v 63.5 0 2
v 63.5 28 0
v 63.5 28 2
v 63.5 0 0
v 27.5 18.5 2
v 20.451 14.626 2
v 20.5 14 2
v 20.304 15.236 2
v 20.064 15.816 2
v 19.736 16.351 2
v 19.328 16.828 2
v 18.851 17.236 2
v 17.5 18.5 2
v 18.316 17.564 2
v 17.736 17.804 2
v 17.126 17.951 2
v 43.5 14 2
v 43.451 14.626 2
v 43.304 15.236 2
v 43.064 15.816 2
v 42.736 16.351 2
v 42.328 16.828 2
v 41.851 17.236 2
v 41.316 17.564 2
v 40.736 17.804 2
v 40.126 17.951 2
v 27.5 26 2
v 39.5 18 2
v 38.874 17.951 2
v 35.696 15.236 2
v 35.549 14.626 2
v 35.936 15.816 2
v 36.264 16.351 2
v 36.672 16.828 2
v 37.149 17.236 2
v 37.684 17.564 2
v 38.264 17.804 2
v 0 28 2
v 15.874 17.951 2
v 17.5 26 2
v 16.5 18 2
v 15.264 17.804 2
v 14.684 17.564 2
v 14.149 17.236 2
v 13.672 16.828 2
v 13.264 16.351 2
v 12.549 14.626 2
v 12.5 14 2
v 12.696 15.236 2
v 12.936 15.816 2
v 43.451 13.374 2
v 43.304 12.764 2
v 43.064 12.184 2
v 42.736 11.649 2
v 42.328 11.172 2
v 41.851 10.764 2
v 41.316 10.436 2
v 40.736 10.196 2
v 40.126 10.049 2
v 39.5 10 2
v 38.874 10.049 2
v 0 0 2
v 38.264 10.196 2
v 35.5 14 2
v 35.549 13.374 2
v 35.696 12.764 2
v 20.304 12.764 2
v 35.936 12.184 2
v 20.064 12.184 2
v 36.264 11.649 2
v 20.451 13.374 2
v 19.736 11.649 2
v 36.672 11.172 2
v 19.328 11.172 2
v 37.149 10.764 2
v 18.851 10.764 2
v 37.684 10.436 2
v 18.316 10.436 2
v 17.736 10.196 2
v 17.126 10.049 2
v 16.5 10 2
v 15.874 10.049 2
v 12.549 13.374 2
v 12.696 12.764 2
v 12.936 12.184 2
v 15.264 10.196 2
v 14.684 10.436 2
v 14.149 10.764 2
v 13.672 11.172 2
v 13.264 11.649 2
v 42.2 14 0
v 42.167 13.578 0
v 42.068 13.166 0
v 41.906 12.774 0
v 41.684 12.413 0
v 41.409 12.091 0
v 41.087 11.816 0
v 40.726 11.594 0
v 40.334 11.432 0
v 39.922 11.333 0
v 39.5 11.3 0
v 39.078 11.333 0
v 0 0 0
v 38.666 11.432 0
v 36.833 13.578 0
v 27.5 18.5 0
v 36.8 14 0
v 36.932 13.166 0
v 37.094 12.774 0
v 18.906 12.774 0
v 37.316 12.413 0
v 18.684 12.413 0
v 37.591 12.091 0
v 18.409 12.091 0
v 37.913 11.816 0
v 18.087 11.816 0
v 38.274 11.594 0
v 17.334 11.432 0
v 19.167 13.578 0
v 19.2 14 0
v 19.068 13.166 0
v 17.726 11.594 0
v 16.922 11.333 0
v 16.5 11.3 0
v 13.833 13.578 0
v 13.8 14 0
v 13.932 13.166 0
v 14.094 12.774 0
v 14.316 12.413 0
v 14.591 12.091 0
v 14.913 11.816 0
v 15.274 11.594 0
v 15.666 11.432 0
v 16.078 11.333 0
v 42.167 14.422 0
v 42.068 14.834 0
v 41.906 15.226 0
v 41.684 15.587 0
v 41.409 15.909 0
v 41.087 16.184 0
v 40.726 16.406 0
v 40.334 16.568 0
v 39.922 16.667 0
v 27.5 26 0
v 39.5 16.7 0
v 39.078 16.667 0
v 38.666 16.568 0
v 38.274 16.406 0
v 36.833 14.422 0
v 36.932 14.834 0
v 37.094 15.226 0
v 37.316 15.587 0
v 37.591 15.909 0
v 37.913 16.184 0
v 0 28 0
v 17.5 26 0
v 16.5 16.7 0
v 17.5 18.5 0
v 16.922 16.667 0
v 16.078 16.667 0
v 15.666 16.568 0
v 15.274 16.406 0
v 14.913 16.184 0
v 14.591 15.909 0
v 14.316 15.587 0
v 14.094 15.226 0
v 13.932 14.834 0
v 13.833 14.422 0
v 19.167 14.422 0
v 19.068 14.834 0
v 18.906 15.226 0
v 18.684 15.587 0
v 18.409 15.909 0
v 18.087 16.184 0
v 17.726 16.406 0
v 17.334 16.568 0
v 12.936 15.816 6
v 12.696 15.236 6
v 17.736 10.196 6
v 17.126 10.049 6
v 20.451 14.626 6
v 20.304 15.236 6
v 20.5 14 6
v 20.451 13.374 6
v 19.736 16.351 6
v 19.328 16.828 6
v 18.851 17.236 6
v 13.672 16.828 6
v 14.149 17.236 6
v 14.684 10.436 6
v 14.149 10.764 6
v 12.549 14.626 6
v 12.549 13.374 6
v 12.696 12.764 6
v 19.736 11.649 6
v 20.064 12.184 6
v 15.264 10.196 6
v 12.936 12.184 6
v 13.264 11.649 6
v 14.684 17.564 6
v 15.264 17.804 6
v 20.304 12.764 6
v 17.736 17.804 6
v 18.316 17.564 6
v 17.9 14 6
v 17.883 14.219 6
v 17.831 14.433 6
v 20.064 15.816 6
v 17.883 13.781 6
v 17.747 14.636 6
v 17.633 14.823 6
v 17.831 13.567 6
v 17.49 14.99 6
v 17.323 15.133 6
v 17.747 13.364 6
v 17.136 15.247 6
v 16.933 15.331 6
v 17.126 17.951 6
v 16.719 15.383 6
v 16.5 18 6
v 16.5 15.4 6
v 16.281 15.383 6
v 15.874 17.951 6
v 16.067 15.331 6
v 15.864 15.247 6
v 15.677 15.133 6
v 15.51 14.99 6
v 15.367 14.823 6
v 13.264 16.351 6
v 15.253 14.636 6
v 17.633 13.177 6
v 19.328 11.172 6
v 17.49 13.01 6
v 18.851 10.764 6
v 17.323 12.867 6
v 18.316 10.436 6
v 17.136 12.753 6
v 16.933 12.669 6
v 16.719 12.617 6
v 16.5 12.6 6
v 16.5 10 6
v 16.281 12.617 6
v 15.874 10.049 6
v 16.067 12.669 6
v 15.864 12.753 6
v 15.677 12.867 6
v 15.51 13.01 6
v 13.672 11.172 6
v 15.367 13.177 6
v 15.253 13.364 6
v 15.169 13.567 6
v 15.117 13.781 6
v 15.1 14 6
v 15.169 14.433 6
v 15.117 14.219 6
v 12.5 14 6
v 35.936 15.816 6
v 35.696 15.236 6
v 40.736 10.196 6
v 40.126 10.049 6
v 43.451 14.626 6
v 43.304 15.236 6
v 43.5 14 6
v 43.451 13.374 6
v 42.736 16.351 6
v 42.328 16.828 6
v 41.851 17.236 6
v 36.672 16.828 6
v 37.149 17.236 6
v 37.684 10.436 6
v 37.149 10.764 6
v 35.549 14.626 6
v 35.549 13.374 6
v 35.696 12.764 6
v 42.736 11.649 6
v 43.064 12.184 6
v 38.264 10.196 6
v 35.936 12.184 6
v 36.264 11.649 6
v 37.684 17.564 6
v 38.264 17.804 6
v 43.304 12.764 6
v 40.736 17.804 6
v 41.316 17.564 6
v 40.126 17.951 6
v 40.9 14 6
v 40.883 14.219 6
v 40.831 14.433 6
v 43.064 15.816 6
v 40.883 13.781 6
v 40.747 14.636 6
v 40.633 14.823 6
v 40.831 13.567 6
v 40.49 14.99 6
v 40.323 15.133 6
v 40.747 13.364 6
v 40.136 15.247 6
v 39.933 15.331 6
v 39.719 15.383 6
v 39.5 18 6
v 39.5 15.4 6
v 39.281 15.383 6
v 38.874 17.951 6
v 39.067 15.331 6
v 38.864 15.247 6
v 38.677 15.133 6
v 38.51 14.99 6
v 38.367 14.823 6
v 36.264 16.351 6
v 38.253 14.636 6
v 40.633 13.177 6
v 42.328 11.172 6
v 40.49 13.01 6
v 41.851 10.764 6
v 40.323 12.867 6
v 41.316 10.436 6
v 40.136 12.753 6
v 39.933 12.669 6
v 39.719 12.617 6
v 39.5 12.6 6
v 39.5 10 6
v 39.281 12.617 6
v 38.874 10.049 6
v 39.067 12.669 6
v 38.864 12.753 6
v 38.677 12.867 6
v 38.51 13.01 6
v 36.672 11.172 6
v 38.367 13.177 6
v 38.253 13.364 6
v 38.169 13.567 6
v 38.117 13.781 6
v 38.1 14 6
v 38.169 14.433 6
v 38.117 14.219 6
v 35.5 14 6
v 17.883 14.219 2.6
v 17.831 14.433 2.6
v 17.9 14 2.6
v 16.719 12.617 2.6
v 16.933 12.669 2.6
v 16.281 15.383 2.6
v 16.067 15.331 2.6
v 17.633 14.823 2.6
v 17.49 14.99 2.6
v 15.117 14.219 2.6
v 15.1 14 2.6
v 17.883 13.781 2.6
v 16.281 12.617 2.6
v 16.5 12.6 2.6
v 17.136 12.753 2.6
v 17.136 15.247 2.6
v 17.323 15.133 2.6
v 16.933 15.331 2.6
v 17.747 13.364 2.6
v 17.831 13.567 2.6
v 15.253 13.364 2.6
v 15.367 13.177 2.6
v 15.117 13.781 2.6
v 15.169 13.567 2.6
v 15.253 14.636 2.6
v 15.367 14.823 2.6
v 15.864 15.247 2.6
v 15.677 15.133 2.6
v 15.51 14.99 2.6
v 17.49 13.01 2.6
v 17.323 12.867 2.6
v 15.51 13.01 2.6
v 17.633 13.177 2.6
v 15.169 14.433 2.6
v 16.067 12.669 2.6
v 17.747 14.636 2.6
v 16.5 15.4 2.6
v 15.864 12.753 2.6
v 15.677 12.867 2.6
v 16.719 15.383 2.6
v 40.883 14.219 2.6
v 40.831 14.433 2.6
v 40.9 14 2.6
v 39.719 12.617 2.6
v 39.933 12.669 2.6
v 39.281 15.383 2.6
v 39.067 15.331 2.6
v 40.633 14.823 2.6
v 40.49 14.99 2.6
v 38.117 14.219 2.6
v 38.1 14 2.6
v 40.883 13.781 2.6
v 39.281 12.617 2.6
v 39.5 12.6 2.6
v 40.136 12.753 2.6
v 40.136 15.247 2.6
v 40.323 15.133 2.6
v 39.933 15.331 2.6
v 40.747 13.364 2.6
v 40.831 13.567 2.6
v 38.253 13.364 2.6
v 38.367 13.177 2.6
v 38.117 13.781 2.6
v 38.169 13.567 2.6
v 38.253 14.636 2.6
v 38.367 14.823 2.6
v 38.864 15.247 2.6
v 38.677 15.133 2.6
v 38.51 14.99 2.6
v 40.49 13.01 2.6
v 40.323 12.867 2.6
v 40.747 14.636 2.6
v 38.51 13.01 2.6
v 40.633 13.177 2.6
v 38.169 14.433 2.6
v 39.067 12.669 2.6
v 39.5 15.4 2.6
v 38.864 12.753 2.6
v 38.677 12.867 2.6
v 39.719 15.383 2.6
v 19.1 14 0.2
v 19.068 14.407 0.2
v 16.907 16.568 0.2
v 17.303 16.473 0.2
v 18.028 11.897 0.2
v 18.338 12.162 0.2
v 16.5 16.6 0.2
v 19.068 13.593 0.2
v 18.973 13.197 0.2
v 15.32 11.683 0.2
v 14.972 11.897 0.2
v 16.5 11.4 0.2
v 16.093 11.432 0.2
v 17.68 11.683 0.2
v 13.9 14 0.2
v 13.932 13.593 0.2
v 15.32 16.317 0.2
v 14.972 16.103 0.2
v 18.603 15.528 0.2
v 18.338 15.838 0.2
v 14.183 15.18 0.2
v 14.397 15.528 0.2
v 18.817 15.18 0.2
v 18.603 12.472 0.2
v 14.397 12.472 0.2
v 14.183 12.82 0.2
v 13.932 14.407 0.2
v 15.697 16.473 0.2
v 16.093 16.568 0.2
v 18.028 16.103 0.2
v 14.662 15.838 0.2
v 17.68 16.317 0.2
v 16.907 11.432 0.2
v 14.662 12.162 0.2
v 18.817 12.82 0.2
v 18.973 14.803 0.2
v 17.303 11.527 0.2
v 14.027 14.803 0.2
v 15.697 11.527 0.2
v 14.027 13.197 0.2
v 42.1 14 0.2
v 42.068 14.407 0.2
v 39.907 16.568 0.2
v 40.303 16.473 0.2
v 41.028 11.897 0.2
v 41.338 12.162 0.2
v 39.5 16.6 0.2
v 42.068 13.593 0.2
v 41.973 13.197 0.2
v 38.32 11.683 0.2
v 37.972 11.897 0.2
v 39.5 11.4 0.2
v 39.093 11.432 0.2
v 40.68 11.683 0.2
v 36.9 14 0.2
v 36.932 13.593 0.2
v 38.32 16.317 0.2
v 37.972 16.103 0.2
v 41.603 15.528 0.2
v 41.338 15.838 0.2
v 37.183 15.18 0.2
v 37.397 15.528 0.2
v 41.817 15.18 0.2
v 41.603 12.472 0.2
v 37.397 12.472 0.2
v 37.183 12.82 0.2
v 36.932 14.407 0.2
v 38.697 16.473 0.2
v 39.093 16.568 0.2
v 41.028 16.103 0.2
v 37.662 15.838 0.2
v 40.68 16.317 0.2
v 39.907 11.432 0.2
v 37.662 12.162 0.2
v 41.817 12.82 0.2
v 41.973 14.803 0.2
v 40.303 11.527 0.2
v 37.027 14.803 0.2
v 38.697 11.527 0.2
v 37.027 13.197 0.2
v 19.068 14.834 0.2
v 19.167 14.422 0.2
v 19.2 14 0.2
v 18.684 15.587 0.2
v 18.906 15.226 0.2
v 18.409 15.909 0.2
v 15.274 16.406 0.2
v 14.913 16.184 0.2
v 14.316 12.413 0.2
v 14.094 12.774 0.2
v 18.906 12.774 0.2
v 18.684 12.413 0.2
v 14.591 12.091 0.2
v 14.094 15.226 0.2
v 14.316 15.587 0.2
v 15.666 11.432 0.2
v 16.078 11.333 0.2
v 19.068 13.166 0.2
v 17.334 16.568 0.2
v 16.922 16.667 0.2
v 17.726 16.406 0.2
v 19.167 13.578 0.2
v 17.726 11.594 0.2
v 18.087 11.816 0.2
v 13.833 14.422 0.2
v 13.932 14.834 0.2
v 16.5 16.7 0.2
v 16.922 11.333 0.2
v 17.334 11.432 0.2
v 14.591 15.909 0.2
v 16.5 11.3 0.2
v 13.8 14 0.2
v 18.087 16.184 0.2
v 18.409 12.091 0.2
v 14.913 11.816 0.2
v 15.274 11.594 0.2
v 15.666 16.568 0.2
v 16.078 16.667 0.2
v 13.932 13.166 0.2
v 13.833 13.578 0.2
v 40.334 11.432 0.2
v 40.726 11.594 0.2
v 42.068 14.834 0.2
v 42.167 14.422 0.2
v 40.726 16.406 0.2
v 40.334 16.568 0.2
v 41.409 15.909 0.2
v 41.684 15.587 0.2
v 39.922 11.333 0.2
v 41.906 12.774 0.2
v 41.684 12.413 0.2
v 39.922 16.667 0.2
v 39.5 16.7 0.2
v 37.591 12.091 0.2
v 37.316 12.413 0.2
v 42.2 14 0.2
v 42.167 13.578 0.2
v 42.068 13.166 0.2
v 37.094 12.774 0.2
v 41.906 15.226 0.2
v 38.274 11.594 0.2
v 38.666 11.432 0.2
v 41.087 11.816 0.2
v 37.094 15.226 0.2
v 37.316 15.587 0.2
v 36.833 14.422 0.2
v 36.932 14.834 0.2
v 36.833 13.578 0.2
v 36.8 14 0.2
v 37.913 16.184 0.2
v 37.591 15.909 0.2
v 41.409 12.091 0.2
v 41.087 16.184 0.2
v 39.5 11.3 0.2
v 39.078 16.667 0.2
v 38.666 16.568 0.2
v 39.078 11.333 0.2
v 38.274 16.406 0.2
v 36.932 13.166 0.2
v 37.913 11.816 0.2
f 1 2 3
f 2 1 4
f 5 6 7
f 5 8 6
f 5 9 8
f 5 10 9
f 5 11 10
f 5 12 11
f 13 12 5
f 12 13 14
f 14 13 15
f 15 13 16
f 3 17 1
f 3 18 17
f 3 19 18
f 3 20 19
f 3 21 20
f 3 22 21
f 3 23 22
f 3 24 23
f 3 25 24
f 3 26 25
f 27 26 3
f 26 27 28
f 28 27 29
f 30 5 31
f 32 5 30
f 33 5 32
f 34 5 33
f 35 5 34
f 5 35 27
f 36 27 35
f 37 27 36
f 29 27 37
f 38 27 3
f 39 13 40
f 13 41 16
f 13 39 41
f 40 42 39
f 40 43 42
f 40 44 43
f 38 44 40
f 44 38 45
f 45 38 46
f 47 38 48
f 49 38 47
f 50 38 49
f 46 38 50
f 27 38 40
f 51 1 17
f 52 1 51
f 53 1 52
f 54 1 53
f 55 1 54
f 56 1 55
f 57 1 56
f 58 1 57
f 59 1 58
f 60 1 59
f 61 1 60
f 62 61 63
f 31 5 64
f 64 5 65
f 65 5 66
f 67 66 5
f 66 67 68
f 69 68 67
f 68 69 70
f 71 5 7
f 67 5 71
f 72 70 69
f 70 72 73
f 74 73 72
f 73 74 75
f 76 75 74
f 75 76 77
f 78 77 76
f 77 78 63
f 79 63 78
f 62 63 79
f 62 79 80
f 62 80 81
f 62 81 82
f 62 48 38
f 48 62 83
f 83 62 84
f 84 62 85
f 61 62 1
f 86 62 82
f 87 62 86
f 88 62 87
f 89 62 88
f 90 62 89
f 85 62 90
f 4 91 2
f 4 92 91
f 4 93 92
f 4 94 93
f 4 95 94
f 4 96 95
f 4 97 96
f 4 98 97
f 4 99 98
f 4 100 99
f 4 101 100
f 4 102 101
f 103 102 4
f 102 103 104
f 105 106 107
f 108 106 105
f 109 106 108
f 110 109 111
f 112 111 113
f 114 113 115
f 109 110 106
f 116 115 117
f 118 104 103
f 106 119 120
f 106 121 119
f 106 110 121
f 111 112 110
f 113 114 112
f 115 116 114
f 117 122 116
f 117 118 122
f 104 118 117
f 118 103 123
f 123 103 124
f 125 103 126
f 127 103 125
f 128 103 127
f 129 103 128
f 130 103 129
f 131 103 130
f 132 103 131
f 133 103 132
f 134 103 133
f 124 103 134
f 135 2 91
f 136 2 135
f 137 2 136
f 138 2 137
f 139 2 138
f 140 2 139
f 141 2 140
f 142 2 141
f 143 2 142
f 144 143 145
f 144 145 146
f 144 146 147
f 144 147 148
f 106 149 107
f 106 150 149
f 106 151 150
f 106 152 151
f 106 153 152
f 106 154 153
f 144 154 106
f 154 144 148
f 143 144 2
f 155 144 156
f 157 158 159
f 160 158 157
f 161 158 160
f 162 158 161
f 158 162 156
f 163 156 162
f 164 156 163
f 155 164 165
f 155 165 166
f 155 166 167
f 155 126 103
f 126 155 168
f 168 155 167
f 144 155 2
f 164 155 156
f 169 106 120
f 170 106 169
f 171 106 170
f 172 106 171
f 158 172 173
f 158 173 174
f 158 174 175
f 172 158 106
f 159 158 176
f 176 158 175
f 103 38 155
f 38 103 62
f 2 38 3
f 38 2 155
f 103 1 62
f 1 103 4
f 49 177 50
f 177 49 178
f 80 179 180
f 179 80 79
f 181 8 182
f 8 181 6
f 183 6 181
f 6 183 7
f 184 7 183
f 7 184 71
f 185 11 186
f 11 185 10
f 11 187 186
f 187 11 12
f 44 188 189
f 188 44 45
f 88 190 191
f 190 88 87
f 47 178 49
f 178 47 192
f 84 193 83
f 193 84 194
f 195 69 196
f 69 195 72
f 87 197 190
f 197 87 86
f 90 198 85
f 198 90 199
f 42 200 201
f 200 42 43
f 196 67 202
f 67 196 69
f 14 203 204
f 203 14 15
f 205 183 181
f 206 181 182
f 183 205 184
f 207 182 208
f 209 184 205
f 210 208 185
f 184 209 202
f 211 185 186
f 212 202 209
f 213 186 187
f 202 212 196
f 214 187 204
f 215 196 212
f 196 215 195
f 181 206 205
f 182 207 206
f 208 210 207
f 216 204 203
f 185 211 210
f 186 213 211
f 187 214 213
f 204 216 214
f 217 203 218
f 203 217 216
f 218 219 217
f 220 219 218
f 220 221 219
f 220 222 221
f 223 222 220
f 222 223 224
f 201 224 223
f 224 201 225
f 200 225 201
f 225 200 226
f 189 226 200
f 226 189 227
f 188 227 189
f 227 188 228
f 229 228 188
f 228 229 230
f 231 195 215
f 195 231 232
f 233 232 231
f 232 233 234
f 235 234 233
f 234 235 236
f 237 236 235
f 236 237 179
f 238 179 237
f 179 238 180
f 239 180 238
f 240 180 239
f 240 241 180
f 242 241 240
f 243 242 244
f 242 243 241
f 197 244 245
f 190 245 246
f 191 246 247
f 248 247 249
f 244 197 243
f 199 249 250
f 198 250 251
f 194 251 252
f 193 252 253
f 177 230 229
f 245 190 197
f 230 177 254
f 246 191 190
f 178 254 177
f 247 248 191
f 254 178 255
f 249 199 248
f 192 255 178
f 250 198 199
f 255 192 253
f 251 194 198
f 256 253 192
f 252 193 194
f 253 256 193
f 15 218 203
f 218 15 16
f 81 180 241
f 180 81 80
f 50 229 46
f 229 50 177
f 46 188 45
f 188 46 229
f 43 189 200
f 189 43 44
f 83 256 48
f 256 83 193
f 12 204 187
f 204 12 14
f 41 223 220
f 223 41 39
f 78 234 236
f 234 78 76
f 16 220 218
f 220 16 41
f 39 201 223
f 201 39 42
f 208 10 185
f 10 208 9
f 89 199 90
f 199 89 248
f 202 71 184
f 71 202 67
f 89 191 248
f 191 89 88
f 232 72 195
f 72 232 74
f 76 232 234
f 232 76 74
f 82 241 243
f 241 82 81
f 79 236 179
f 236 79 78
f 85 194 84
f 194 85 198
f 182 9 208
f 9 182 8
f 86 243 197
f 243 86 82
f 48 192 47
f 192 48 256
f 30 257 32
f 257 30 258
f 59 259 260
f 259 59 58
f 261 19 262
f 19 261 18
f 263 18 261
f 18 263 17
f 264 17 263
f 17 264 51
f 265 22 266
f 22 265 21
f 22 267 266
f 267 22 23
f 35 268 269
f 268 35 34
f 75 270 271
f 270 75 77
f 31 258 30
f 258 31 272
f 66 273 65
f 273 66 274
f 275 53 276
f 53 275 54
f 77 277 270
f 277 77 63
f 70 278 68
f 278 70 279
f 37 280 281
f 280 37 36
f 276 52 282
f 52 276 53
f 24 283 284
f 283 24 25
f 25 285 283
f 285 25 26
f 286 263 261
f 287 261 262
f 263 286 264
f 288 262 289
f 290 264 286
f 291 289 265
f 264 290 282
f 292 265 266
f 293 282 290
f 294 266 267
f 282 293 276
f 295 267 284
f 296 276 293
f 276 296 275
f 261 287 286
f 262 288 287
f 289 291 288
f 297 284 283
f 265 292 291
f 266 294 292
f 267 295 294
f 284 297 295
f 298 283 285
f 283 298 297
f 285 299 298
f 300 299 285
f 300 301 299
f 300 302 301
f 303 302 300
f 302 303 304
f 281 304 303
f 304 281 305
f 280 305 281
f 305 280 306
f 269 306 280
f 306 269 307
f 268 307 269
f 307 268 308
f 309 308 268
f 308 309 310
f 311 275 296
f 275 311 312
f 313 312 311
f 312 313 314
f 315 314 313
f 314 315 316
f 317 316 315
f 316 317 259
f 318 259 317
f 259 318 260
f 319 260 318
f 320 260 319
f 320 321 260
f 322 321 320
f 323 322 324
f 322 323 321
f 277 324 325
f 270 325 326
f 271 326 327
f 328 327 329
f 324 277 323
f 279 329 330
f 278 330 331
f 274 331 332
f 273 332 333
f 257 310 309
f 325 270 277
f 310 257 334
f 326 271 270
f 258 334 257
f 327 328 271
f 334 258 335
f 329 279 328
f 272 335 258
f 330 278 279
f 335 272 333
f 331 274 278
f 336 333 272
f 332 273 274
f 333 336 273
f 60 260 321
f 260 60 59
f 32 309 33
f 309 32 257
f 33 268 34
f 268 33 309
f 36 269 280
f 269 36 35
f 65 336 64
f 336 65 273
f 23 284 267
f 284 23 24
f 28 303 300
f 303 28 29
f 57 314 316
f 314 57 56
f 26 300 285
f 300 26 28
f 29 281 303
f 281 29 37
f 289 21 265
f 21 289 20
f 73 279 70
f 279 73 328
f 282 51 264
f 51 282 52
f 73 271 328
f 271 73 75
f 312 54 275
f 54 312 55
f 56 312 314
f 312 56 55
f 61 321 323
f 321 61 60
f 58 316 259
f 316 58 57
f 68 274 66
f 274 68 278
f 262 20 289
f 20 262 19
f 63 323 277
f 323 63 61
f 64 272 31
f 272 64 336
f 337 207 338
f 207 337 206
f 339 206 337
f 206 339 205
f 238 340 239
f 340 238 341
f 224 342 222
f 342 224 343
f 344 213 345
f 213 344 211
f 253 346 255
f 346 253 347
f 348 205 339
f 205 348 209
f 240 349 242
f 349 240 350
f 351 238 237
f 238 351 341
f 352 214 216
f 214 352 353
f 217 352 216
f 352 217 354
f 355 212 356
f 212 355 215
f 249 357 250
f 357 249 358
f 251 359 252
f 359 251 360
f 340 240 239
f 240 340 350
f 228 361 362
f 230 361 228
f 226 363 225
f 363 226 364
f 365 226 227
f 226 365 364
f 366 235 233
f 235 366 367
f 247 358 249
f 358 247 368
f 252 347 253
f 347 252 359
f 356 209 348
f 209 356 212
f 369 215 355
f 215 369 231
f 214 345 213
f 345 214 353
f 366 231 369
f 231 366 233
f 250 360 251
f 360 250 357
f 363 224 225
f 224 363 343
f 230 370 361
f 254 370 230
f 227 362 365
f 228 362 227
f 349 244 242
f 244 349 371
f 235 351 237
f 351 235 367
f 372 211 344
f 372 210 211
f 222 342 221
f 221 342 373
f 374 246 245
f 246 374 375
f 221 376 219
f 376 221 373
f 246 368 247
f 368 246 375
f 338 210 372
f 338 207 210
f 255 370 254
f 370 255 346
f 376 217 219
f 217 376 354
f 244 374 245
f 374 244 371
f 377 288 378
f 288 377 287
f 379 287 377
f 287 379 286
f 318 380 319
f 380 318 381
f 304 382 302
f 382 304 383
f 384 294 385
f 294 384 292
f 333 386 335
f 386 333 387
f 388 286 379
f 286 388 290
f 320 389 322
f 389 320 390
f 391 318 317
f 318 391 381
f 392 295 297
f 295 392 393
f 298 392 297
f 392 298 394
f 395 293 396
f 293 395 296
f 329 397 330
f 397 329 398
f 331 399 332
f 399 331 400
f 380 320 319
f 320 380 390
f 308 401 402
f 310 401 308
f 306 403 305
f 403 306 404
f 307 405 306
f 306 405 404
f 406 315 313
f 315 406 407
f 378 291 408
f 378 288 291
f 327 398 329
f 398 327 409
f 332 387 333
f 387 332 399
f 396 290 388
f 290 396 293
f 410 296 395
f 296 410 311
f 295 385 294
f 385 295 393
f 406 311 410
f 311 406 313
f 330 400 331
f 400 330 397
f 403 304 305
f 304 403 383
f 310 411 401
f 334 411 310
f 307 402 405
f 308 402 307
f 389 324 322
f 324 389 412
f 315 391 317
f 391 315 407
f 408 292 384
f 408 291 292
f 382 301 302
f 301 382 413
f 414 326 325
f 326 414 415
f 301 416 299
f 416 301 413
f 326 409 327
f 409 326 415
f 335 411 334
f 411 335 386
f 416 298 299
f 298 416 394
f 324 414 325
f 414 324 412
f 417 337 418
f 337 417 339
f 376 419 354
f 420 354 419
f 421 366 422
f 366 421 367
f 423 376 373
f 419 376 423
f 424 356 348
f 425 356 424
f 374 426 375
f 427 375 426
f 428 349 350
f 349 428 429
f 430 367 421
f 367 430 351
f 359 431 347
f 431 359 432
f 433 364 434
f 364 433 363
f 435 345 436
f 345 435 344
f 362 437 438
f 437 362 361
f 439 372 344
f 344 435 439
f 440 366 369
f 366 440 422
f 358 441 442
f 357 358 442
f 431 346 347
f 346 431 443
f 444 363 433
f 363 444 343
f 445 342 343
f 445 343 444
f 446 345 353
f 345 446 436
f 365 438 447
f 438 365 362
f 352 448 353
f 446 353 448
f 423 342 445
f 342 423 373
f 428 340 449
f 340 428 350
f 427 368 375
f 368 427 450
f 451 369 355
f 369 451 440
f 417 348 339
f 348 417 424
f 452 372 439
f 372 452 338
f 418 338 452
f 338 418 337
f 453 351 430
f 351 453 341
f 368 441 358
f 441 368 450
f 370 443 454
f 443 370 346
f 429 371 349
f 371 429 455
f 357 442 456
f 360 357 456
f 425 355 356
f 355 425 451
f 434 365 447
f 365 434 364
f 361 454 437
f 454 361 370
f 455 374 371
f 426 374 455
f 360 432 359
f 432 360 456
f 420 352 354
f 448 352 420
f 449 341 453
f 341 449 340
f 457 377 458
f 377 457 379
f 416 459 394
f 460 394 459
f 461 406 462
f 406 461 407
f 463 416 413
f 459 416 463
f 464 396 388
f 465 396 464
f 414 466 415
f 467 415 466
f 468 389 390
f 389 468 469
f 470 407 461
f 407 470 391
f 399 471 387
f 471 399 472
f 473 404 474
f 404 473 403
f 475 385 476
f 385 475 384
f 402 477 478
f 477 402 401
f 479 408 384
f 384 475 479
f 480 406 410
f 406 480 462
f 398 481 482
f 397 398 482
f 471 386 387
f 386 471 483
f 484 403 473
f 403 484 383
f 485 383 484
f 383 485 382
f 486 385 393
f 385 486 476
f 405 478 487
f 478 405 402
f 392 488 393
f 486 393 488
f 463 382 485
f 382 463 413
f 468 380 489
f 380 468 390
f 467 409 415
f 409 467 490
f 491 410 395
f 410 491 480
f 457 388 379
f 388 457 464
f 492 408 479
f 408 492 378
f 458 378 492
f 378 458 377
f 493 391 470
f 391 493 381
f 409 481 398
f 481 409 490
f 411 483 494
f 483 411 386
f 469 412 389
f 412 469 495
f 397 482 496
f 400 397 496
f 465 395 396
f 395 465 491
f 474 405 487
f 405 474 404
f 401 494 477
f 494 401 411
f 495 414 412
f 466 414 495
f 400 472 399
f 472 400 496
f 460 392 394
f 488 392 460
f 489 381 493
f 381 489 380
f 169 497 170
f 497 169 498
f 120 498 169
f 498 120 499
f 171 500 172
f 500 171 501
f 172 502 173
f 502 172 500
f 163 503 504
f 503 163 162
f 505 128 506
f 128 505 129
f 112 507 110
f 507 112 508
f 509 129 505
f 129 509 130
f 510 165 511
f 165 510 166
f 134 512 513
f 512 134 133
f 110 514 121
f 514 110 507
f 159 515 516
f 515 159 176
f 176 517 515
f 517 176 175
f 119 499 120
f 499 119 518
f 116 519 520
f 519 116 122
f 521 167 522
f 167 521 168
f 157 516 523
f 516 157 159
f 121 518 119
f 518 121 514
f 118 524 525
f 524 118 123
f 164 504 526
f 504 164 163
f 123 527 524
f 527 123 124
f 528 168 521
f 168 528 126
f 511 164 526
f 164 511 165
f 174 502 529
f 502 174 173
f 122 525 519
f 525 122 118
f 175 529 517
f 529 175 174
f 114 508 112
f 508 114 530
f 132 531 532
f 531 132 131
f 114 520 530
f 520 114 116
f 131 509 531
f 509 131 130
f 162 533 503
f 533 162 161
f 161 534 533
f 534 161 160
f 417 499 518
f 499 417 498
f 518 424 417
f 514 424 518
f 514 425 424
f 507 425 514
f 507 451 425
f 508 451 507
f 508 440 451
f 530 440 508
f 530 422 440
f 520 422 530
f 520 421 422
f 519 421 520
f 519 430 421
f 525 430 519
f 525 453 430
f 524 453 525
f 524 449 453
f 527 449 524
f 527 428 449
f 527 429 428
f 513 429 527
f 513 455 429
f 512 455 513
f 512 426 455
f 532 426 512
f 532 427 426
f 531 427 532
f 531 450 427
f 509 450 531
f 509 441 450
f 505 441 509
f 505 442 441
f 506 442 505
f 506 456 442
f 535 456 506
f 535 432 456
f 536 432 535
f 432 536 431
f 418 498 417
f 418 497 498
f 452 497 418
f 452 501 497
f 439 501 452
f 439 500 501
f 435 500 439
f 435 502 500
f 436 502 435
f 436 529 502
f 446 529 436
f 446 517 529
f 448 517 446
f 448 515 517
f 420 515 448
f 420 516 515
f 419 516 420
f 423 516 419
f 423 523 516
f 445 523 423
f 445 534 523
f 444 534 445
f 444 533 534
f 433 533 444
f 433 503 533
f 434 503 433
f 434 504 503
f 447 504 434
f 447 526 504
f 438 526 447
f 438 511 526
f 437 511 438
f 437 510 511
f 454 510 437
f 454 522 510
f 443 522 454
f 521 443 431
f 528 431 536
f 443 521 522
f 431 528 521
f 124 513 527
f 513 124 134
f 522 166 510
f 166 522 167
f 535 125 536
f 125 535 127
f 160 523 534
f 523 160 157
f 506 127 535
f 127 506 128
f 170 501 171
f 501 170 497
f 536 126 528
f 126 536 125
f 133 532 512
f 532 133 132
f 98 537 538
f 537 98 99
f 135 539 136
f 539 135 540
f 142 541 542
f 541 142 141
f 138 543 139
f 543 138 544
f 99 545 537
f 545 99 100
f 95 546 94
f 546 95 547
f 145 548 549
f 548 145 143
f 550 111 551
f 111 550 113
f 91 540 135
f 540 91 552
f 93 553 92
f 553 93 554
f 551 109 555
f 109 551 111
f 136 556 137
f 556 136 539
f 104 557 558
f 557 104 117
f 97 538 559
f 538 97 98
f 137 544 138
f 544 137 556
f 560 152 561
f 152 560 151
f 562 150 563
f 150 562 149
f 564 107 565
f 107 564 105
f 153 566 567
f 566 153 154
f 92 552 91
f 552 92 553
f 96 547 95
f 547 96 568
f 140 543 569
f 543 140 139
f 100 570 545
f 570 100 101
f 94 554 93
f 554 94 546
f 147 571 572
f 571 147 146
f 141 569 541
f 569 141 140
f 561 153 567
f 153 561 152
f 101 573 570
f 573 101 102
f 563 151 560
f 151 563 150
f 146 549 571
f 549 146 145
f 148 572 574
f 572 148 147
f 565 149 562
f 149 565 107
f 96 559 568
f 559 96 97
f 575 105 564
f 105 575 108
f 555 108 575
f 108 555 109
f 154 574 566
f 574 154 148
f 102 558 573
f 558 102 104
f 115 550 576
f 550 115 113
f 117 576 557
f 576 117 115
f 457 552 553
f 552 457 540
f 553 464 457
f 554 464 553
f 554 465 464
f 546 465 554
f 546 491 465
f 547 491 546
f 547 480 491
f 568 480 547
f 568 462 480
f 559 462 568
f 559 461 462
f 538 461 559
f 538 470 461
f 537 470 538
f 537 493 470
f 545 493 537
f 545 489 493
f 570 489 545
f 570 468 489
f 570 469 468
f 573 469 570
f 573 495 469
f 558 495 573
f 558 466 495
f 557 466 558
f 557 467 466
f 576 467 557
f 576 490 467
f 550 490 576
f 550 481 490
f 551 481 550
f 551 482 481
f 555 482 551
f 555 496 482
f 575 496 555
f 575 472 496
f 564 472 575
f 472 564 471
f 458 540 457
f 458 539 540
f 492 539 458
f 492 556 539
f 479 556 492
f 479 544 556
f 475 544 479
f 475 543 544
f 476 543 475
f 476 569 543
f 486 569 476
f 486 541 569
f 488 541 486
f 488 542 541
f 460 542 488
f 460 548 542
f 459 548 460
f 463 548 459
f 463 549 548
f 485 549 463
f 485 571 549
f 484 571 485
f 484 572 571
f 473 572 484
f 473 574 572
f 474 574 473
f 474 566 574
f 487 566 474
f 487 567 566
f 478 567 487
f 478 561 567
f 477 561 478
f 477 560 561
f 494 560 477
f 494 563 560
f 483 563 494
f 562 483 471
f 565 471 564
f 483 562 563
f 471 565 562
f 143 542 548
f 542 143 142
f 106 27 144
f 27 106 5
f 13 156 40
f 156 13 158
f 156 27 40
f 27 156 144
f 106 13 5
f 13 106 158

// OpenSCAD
// Insulator for sensor board with mounting for ultrasonic transducer

$fn=40;
thickness = 2;
holeY=14;
hole1X=16.5;
hole2X=hole1X+23;
transducerY = 4.5;
pillarHeight = 4.0;
pillarRadius = 4.0;	// use 4.5 if using deep countersinks
overlap=1;

difference() {
	union() {
		// main plate
		cube([63.5,28,thickness]);
		// pillars
		translate([hole1X,holeY,thickness-overlap]) cylinder(h=pillarHeight+overlap,r=pillarRadius);
		translate([hole2X,holeY,thickness-overlap]) cylinder(h=pillarHeight+overlap,r=pillarRadius);
	}
	// screw holes in pillars
	translate([hole1X,holeY,-overlap]) cylinder(h=20,r=1.4);
	translate([hole2X,holeY,-overlap]) cylinder(h=20,r=1.4);
	// countersinks, leaving about 3mm of screw to tap into the heatsink duct
	translate([hole1X,holeY,pillarHeight-3.9]) cylinder(r1=2.65,r2=0,h=5.3);
	translate([hole2X,holeY,pillarHeight-3.9]) cylinder(r1=2.65,r2=0,h=5.3);
	// holes for the screw heads, overlapping the countersinks by 0.1mm
	translate([hole1X,holeY,-overlap]) cylinder(r=2.7,h=pillarHeight-3.8+overlap);
	translate([hole2X,holeY,-overlap]) cylinder(r=2.7,h=pillarHeight-3.8+overlap);
	// cutout to allow in-situ programming
	translate([hole1X+1,holeY+4.5,-overlap]) cube([10,7.5,thickness+2*overlap]);
}
